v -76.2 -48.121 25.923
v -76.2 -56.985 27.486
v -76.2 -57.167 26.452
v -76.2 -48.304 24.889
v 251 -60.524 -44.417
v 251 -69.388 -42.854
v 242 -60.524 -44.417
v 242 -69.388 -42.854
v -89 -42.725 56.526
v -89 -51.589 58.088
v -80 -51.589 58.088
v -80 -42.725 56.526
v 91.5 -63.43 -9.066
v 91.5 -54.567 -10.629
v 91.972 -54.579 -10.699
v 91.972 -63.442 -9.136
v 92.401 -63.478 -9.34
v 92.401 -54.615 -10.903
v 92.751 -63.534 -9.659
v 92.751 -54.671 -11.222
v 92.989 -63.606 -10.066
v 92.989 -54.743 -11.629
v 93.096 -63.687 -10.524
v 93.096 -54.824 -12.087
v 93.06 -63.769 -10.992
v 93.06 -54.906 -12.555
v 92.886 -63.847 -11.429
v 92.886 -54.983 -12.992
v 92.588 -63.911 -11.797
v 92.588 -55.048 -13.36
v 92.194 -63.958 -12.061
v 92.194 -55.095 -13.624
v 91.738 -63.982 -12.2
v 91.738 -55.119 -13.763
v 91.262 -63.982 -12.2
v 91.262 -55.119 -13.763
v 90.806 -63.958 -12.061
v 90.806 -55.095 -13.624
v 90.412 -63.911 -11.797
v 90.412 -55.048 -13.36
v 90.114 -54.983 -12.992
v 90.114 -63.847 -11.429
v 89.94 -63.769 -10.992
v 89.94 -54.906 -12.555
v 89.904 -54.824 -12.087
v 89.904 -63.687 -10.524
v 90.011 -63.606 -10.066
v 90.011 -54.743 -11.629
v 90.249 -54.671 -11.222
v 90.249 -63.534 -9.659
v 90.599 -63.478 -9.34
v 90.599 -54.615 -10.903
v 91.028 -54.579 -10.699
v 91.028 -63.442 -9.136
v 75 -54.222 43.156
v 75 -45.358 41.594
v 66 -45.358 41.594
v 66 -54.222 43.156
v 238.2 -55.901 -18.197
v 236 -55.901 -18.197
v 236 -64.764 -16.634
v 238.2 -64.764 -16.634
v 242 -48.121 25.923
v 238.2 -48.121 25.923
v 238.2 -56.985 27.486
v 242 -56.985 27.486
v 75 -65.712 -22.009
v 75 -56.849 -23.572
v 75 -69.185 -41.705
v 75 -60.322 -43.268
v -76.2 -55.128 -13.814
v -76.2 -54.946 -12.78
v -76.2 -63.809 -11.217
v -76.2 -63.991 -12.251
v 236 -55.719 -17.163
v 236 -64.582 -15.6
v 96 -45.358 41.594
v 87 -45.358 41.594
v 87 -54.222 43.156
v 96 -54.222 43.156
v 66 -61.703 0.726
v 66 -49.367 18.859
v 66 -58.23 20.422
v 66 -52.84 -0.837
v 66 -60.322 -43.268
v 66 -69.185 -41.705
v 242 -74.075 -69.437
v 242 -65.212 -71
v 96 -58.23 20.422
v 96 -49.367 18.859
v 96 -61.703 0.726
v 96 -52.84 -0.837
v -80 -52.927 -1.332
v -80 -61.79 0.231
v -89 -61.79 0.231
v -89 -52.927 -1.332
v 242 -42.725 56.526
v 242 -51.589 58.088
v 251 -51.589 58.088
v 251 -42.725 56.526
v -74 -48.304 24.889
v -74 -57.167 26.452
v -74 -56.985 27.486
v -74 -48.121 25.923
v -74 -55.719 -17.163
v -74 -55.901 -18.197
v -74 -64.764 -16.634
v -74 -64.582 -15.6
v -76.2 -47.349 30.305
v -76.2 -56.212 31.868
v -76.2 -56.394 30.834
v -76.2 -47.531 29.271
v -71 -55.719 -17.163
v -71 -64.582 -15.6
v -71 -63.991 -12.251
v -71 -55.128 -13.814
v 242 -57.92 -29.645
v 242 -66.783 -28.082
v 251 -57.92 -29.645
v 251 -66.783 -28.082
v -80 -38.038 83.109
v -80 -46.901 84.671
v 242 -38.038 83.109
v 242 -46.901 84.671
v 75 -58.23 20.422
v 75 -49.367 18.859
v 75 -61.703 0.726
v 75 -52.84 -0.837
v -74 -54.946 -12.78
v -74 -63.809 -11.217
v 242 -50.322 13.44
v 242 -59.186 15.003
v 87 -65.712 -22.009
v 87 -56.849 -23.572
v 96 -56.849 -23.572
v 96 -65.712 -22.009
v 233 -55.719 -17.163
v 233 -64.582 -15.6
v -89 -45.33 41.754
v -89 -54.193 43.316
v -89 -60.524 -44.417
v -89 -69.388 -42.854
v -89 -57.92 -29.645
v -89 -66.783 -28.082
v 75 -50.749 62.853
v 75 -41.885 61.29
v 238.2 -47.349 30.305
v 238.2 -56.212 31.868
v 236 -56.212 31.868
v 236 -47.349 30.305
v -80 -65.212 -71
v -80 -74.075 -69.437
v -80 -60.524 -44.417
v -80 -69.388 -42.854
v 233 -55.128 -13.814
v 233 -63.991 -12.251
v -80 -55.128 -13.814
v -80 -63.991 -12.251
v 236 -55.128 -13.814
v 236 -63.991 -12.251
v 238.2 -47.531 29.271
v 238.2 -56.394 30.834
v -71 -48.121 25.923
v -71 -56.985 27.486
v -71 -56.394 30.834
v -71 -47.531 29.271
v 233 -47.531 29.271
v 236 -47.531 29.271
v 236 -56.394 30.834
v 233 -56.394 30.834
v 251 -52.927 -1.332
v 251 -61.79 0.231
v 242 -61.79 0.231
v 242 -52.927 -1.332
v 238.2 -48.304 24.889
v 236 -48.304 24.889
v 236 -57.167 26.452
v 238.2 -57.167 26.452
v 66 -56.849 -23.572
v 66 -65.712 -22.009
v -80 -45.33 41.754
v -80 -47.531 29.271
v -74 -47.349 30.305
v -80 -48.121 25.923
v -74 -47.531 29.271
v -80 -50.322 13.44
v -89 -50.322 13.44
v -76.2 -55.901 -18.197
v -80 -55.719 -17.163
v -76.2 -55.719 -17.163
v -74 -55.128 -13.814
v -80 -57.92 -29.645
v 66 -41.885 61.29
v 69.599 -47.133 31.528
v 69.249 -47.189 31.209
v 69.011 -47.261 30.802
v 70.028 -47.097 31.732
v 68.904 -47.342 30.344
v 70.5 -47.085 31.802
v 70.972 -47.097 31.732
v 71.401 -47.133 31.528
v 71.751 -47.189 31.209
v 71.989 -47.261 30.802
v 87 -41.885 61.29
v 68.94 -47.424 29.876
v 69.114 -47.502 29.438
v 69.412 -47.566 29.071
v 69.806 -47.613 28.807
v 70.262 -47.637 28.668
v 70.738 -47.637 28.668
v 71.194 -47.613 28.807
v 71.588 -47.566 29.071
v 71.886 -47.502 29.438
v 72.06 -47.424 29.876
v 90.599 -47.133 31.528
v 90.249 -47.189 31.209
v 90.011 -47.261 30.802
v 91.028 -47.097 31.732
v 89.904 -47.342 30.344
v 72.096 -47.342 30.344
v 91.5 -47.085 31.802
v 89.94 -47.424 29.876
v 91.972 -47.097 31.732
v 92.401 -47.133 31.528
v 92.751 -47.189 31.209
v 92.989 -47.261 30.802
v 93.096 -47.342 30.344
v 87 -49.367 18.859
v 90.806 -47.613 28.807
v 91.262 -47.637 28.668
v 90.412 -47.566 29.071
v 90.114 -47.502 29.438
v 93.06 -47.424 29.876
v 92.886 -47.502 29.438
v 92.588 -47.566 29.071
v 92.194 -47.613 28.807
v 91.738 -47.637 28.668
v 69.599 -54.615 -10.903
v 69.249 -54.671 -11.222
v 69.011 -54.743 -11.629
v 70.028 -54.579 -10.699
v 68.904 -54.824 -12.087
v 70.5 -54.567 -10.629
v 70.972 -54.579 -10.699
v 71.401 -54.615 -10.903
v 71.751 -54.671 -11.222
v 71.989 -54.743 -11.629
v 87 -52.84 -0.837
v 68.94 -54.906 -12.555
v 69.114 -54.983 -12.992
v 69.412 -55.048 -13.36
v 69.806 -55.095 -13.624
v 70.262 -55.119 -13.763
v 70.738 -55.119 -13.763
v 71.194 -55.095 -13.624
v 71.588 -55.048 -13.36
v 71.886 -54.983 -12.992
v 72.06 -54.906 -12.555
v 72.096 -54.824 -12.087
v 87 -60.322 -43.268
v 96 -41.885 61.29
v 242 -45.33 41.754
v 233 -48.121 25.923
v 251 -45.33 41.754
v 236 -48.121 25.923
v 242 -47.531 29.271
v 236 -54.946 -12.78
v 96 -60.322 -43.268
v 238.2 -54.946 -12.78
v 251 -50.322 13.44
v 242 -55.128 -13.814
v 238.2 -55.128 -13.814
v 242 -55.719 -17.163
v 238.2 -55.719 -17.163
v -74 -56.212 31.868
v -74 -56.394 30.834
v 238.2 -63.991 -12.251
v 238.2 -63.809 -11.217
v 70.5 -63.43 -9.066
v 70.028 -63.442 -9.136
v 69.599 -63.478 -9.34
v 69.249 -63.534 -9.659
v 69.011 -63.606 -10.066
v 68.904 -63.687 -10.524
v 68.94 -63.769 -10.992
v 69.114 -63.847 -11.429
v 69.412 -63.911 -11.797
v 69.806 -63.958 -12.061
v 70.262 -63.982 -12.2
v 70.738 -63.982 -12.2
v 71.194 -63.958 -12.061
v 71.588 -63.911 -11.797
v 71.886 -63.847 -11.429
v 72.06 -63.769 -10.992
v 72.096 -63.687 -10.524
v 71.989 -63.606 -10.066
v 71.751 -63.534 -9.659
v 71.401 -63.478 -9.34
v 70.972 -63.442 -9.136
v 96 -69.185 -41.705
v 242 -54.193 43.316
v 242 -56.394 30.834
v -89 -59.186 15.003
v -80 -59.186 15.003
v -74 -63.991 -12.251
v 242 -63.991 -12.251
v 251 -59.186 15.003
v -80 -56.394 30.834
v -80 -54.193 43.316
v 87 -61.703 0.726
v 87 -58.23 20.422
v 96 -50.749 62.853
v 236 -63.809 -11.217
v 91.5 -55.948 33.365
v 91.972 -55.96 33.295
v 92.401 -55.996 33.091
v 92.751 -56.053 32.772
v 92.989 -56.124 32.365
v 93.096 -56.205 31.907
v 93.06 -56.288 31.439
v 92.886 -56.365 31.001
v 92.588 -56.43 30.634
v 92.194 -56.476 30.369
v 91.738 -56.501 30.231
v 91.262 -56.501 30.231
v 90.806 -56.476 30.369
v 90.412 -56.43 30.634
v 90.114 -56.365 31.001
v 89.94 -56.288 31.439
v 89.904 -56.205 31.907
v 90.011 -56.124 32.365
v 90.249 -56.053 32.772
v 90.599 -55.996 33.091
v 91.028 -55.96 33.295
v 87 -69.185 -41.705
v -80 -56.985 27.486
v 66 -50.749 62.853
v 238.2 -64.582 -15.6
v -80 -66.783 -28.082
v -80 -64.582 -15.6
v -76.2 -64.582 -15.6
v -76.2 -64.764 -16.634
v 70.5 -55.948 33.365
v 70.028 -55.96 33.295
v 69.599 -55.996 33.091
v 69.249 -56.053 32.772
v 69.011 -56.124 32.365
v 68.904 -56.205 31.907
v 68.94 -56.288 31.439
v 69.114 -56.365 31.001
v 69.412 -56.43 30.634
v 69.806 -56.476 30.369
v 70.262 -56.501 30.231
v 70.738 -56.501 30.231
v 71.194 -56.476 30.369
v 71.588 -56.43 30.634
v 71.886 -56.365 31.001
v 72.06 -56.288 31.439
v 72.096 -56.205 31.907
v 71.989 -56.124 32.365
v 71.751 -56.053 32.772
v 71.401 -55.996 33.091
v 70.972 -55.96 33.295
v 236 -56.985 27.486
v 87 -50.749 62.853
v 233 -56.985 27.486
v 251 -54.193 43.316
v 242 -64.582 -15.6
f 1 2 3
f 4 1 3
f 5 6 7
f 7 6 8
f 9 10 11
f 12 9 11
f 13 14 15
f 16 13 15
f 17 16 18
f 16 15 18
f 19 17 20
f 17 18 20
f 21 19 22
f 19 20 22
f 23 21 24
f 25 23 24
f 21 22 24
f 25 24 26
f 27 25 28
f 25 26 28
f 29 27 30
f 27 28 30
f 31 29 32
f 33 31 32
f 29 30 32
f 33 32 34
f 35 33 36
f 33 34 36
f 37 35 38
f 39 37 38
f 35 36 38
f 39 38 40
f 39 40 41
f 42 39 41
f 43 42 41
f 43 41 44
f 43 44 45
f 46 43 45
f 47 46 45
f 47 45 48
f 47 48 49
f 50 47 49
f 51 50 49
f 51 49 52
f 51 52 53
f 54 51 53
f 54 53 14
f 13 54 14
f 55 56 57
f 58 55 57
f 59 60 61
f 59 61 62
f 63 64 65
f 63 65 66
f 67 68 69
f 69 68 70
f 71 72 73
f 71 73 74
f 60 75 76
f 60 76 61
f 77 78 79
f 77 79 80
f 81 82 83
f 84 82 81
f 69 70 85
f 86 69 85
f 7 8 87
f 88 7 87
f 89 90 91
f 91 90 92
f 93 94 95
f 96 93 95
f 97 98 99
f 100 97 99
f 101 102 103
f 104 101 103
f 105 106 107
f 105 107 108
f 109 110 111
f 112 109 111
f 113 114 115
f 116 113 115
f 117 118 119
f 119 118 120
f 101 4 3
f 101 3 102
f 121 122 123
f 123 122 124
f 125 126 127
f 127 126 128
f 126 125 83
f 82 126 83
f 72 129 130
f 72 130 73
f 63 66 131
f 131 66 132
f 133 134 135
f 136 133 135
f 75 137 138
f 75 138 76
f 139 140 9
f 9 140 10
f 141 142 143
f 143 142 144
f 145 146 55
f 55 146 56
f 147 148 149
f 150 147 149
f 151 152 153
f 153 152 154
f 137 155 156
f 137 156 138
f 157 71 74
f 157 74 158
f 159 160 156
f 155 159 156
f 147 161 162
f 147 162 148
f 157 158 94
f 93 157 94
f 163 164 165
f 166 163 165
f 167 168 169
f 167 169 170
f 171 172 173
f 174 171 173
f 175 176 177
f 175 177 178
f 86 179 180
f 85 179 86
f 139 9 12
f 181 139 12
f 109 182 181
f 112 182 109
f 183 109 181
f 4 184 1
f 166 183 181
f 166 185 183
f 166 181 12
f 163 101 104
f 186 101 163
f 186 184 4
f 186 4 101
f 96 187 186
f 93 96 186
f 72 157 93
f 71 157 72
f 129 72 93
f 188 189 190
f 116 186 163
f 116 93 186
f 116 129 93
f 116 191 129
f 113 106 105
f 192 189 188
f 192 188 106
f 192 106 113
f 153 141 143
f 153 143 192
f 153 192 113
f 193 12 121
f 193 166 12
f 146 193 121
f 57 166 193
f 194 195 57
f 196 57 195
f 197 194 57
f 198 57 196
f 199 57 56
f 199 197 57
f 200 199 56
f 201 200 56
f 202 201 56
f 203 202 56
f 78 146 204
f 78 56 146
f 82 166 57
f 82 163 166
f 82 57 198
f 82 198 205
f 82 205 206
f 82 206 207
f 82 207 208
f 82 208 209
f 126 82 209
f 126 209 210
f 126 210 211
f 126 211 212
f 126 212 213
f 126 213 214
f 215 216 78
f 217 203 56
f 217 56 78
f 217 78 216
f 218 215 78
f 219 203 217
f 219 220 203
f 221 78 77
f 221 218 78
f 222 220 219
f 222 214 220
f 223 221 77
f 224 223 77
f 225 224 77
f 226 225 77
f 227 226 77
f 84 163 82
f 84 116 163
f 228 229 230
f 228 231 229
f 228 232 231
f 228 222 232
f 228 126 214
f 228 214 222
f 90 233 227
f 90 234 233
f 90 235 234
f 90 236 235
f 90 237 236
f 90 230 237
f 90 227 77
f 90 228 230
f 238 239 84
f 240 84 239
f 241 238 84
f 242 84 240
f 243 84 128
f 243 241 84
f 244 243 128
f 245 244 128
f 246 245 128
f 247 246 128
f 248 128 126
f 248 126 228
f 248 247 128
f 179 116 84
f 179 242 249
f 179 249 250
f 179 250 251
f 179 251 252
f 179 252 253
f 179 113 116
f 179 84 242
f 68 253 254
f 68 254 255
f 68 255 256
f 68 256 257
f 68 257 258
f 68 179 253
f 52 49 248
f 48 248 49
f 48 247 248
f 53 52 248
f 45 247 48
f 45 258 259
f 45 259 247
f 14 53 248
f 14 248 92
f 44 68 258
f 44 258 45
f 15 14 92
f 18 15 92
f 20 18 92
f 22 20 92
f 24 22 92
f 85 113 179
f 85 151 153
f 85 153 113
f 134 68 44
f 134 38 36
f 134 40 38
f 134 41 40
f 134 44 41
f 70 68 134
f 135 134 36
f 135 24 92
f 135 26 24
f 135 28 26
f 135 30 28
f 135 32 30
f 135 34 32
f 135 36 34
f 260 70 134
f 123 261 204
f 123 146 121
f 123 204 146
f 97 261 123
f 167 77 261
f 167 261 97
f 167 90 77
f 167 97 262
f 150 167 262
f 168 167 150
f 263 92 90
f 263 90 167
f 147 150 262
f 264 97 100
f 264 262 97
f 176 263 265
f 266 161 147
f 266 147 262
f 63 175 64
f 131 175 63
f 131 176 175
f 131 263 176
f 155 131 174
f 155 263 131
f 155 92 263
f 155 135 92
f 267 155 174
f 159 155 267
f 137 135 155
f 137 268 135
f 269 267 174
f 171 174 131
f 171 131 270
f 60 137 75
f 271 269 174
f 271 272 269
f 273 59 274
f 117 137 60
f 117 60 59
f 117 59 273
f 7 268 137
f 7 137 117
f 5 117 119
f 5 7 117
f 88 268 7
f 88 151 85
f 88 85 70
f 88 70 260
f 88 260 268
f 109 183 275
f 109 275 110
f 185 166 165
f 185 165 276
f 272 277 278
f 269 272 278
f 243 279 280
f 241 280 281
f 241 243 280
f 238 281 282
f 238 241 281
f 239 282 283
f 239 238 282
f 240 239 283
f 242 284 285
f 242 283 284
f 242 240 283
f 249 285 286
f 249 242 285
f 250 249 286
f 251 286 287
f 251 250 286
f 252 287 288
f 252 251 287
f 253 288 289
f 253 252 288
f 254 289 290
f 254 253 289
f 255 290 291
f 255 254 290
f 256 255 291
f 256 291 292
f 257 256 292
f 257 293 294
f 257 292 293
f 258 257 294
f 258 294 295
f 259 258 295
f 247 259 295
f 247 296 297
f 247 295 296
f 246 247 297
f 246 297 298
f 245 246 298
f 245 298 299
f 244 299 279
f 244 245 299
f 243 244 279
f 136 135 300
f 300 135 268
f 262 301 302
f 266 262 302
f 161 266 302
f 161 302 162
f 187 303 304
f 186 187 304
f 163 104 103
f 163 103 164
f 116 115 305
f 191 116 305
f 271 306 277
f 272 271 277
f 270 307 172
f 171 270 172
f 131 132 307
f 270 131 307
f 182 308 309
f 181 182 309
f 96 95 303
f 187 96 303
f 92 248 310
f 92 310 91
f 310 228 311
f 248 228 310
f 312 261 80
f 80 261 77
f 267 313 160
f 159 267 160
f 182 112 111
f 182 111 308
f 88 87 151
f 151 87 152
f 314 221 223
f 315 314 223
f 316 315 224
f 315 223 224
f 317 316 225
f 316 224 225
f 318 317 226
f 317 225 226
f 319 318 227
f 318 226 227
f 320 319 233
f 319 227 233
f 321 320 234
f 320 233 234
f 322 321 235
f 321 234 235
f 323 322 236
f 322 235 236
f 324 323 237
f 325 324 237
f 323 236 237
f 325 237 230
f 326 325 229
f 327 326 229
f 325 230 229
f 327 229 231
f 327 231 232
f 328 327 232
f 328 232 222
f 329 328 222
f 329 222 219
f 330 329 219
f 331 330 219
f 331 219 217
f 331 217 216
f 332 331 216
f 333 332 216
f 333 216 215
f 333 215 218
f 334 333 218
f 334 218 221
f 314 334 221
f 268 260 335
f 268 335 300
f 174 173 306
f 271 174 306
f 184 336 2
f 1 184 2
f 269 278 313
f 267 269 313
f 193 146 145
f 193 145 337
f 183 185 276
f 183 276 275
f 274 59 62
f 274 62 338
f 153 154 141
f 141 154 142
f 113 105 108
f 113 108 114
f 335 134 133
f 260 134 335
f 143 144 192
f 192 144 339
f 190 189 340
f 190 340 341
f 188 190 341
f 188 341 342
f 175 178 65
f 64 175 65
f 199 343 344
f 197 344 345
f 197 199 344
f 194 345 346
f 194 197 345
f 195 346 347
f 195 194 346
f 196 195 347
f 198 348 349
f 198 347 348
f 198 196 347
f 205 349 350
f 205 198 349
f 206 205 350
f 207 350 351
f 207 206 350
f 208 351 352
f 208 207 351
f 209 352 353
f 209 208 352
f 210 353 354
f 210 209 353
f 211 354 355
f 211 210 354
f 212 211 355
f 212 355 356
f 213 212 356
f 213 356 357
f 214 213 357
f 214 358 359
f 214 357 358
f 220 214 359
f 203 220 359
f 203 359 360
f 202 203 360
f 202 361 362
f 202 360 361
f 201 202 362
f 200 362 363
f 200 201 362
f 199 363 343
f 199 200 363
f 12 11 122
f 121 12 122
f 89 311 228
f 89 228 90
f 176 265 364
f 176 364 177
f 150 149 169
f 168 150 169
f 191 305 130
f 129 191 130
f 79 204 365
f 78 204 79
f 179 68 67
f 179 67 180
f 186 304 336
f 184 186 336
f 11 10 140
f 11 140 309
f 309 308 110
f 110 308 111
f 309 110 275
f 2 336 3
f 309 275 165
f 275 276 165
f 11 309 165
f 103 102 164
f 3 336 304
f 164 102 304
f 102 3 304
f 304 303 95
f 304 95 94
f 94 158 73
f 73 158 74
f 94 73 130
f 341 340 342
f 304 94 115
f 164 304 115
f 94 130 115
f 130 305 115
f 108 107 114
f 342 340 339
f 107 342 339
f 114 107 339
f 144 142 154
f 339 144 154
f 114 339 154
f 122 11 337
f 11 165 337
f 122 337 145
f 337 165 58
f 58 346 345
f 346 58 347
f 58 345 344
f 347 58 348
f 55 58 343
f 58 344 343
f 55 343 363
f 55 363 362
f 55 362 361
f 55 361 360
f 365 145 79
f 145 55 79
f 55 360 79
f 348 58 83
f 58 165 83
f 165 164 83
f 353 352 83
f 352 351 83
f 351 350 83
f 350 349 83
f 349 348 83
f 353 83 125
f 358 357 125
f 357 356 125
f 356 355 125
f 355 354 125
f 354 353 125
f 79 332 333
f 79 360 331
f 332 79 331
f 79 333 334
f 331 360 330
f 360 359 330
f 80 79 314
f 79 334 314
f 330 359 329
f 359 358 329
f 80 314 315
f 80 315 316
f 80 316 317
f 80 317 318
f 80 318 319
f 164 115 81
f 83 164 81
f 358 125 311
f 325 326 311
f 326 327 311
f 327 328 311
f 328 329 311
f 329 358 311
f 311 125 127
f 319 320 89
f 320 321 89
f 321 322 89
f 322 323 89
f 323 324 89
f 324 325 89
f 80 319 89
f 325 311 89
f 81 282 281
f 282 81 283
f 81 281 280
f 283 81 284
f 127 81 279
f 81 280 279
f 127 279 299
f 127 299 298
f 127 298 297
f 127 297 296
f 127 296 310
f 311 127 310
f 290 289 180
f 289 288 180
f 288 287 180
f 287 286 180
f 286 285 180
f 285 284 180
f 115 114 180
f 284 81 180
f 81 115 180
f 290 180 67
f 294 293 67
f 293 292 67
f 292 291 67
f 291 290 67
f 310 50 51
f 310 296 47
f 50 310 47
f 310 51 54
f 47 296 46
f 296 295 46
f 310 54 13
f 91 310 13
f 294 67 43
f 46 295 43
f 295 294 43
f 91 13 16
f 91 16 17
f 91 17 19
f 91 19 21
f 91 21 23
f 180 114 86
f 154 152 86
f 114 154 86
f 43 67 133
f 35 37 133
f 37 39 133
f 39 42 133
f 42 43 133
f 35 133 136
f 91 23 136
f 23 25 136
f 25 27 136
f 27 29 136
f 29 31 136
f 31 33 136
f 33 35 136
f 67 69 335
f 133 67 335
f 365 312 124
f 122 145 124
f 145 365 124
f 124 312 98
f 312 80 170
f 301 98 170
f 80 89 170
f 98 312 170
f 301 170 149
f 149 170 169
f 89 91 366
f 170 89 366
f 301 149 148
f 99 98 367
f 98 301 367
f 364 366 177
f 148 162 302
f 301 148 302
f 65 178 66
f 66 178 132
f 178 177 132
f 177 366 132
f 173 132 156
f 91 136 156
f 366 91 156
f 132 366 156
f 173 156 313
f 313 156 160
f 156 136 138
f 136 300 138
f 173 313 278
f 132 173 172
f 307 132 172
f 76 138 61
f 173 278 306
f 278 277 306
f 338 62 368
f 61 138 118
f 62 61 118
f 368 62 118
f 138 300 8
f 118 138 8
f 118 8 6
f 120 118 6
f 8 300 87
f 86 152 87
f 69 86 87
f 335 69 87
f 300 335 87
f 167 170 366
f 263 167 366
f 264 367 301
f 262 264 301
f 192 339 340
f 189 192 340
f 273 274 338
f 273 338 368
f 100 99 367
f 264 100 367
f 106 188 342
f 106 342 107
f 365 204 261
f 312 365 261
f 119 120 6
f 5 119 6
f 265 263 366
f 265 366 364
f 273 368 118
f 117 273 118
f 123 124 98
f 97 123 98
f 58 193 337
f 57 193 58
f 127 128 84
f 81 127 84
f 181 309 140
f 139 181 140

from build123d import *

# Parameters (mm, degrees)
BOSS_EXTRUDE1_DEPTH = 9
CUT_EXTRUDE1_DEPTH  = 265.443626141
SKETCH5_R           = 1.6
SKETCH5_W           = 9
SKETCH5_H           = 20
CUT_EXTRUDE2_DEPTH  = 265.443626141


with BuildPart() as part:
    # Sketch2 → Boss-Extrude1 (new body)
    with BuildSketch(Plane(origin=(0, -59.966770125, 10.573759519), x_dir=(1, 0, 0), z_dir=(0, 0.9848077530122079, -0.1736481776669316))):
        Polygon((-80, -33.247729948), (-89, -33.247729948), (-89, -48.247729948), (-80, -48.247729948), (-80, -75.240683317), (242, -75.240683317), (242, -48.247729948), (251, -48.247729948), (251, -33.247729948), (242, -33.247729948), (242, -4.497729948), (251, -4.497729948), (251, 10.502270052), (242, 10.502270052), (242, 39.252270052), (251, 39.252270052), (251, 54.252270052), (242, 54.252270052), (242, 81.245223421), (-80, 81.245223421), (-80, 54.252270052), (-89, 54.252270052), (-89, 39.252270052), (-80, 39.252270052), (-80, 10.502270052), (-89, 10.502270052), (-89, -4.497729948), (-80, -4.497729948), align=None)
    extrude(amount=BOSS_EXTRUDE1_DEPTH)

    # Sketch4 → Cut-Extrude1 (cut, through all)
    with BuildSketch(Plane(origin=(0, -51.103500347, 9.01092592), x_dir=(1, 0, 0), z_dir=(0, 0.9848077530122079, -0.17364817766693172))):
        Polygon((-80, -17.172729948), (-76.2, -17.172729948), (-76.2, -16.122729948), (-74, -16.122729948), (-74, -17.172729948), (-71, -17.172729948), (-71, -20.572729948), (-74, -20.572729948), (-74, -21.622729948), (-76.2, -21.622729948), (-76.2, -20.572729948), (-80, -20.572729948), align=None)
        Polygon((-80, 23.177270052), (-80, 26.577270052), (-76.2, 26.577270052), (-76.2, 27.627270052), (-74, 27.627270052), (-74, 26.577270052), (-71, 26.577270052), (-71, 23.177270052), (-74, 23.177270052), (-74, 22.127270052), (-76.2, 22.127270052), (-76.2, 23.177270052), align=None)
        Polygon((242, 23.177270052), (238.2, 23.177270052), (238.2, 22.127270052), (236, 22.127270052), (236, 23.177270052), (233, 23.177270052), (233, 26.577270052), (236, 26.577270052), (236, 27.627270052), (238.2, 27.627270052), (238.2, 26.577270052), (242, 26.577270052), align=None)
        Polygon((242, -17.172729948), (242, -20.572729948), (238.2, -20.572729948), (238.2, -21.622729948), (236, -21.622729948), (236, -20.572729948), (233, -20.572729948), (233, -17.172729948), (236, -17.172729948), (236, -16.122729948), (238.2, -16.122729948), (238.2, -17.172729948), align=None)
    extrude(amount=-CUT_EXTRUDE1_DEPTH, mode=Mode.SUBTRACT)

    # Sketch5 → Cut-Extrude2 (cut, through all)
    with BuildSketch(Plane(origin=(0, -51.103500347, 9.01092592), x_dir=(1, 0, 0), z_dir=(0, 0.9848077530122078, -0.1736481776669317))):
        with Locations(Location((91.5, -21.542669597, 0), (0, 0, 270))):
            Circle(SKETCH5_R)
        with Locations(Location((91.5, 21.542669597, 0), (0, 0, 270))):
            Circle(SKETCH5_R)
        with Locations((91.5, -43.085339194)):
            Rectangle(SKETCH5_W, SKETCH5_H)
        with Locations((91.5, 0)):
            Rectangle(SKETCH5_W, SKETCH5_H)
        with Locations((91.5, 43.085339194)):
            Rectangle(SKETCH5_W, SKETCH5_H)
    cut_extrude2 = extrude(amount=-CUT_EXTRUDE2_DEPTH, mode=Mode.SUBTRACT)

    # Mirror1: Cut-Extrude2 across plane
    add(cut_extrude2.mirror(Plane.ZY.offset(-81)), mode=Mode.SUBTRACT)


solid = part.part
